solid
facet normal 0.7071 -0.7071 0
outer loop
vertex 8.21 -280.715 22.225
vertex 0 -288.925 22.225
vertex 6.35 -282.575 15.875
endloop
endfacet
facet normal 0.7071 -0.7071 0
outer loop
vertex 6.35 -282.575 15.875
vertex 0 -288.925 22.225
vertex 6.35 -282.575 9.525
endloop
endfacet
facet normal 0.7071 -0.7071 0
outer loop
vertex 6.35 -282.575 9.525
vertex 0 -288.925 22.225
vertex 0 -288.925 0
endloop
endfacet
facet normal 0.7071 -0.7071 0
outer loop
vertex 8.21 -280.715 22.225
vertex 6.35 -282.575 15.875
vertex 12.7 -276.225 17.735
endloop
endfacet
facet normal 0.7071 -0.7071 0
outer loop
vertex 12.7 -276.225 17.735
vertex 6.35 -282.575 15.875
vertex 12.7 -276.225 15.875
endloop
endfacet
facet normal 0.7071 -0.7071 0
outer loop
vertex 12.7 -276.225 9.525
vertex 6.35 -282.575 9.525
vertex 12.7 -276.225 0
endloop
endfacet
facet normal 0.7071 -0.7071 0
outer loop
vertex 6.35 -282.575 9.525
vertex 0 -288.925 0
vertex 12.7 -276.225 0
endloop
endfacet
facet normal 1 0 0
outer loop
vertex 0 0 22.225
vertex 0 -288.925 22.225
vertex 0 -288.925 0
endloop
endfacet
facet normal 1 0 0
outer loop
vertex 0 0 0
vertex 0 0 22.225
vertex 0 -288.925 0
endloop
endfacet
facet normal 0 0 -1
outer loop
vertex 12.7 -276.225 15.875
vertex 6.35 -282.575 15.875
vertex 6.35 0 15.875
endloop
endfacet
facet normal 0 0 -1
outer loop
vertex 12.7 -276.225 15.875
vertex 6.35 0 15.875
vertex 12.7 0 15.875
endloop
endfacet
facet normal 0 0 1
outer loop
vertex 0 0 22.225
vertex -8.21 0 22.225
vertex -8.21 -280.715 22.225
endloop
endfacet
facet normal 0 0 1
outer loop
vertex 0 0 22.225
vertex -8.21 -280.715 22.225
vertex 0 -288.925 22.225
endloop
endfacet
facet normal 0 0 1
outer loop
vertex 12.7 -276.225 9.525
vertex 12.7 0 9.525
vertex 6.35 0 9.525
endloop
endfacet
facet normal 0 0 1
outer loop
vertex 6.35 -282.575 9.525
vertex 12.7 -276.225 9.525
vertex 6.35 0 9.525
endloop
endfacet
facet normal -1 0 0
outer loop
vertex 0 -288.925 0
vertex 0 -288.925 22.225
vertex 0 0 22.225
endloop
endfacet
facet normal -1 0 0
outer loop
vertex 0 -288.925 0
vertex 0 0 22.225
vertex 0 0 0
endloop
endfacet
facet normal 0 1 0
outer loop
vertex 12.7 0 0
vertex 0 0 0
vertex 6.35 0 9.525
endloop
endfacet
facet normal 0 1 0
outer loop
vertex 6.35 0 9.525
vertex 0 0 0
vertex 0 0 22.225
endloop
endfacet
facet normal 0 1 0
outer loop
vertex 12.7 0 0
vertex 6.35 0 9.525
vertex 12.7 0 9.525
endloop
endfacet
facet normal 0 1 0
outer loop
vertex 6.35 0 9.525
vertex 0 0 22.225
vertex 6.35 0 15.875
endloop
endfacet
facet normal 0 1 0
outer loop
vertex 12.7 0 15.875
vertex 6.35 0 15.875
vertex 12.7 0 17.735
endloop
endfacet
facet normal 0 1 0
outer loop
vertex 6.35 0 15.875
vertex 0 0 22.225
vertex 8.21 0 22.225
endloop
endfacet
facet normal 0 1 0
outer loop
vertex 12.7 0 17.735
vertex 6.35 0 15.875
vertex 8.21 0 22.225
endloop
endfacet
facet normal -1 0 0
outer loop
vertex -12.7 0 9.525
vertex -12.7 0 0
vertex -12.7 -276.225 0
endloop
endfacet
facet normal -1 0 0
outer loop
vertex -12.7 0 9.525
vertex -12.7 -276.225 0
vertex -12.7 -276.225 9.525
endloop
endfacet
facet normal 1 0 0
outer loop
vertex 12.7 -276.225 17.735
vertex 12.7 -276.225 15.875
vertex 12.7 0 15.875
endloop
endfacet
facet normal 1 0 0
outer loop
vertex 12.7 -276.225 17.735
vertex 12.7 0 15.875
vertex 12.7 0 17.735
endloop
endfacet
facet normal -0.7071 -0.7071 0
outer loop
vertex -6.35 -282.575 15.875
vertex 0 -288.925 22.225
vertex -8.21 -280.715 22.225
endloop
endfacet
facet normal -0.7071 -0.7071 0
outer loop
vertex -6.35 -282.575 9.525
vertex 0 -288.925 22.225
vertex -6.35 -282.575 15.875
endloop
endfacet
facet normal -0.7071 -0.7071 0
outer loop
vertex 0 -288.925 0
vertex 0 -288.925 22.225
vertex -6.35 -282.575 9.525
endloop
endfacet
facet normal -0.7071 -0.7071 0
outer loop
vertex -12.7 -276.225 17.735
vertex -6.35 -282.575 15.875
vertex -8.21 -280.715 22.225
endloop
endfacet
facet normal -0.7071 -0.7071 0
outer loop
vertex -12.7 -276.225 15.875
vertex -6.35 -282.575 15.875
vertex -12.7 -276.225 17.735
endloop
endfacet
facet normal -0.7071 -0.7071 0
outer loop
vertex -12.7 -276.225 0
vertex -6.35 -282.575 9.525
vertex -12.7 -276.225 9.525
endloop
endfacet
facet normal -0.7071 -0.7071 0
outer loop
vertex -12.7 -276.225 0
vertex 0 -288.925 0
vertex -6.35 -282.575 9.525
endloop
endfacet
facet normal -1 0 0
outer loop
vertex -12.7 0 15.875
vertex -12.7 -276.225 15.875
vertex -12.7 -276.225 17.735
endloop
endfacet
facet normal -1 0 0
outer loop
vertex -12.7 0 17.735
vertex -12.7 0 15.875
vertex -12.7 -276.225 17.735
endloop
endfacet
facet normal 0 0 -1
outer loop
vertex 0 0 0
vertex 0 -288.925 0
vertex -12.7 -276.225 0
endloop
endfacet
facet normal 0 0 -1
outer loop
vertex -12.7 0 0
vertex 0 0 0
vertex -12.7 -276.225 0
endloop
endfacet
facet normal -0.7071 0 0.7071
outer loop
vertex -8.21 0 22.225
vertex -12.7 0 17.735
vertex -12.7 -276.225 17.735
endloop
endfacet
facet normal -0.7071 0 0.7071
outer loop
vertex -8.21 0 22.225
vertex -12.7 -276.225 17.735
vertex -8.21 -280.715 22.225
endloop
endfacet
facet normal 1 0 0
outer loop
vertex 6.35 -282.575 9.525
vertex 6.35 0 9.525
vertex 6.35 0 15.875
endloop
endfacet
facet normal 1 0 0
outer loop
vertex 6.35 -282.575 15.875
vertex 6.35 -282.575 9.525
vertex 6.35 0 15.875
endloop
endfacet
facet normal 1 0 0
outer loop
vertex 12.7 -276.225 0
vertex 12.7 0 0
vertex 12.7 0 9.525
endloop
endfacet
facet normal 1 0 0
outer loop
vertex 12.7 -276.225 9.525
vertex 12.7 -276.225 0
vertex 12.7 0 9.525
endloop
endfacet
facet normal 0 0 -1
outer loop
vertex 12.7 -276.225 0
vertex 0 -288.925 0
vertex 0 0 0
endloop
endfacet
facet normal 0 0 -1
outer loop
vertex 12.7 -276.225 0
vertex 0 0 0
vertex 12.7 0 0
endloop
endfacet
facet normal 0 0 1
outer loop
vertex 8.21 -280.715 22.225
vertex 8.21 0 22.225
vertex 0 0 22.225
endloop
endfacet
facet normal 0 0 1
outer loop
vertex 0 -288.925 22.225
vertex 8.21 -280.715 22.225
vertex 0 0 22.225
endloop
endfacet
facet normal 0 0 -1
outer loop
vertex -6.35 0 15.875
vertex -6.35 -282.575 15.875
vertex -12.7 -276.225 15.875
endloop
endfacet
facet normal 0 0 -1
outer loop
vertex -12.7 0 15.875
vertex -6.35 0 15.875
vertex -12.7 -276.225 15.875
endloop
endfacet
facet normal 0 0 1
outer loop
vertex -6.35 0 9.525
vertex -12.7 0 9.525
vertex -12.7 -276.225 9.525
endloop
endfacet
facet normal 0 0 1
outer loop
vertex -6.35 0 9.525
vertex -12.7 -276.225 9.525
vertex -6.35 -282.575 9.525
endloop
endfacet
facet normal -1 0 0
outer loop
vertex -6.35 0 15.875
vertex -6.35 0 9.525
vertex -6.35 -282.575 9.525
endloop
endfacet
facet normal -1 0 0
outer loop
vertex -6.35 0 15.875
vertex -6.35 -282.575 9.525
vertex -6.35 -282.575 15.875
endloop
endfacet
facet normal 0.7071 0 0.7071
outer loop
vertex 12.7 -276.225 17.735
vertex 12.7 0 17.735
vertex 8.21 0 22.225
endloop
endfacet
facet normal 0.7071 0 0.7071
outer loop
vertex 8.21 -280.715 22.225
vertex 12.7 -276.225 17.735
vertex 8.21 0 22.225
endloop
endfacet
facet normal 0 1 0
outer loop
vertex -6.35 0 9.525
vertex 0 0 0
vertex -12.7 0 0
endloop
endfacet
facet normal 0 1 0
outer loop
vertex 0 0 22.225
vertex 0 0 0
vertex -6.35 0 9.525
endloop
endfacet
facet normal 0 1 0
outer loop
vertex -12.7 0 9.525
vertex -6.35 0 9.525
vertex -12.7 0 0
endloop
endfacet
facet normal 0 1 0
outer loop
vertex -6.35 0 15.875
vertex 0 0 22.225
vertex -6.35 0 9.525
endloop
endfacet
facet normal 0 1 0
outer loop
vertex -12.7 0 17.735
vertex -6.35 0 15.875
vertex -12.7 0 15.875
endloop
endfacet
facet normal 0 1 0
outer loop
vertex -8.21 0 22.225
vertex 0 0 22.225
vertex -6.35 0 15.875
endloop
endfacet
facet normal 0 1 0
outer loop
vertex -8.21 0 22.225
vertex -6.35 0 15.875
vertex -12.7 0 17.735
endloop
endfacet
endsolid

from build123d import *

# Parameters (mm, degrees)
F1_DEPTH = 288.925
F3_DEPTH = 22.226


with BuildPart() as f1:
    # F0 (on Front) → F1 (new body)
    with BuildSketch(Plane.XZ):
        Polygon((0, 22.225), (0, 0), (12.7, 0), (12.7, 9.525), (6.35, 9.525), (6.35, 15.875), (12.7, 15.875), (12.7, 17.734872), (8.209872, 22.225), align=None)
    extrude(amount=F1_DEPTH)

    # F2 (on face) → F3 (cut, through all)
    with BuildSketch(Plane(origin=(0, 0, 0), x_dir=(1, 0, 0), z_dir=(0, 0, -1))):
        Polygon((12.7, 288.925), (0, 288.925), (12.7, 276.225), align=None)
    extrude(amount=-F3_DEPTH, mode=Mode.SUBTRACT)


with BuildPart() as f4_1:
    # F4: instance of F1
    add(f1.part.mirror(Plane(origin=(0, -144.4625, 11.1125), x_dir=(0, -1, 0), z_dir=(-1, 0, 0))))


solid = Compound([f1.part, f4_1.part])
